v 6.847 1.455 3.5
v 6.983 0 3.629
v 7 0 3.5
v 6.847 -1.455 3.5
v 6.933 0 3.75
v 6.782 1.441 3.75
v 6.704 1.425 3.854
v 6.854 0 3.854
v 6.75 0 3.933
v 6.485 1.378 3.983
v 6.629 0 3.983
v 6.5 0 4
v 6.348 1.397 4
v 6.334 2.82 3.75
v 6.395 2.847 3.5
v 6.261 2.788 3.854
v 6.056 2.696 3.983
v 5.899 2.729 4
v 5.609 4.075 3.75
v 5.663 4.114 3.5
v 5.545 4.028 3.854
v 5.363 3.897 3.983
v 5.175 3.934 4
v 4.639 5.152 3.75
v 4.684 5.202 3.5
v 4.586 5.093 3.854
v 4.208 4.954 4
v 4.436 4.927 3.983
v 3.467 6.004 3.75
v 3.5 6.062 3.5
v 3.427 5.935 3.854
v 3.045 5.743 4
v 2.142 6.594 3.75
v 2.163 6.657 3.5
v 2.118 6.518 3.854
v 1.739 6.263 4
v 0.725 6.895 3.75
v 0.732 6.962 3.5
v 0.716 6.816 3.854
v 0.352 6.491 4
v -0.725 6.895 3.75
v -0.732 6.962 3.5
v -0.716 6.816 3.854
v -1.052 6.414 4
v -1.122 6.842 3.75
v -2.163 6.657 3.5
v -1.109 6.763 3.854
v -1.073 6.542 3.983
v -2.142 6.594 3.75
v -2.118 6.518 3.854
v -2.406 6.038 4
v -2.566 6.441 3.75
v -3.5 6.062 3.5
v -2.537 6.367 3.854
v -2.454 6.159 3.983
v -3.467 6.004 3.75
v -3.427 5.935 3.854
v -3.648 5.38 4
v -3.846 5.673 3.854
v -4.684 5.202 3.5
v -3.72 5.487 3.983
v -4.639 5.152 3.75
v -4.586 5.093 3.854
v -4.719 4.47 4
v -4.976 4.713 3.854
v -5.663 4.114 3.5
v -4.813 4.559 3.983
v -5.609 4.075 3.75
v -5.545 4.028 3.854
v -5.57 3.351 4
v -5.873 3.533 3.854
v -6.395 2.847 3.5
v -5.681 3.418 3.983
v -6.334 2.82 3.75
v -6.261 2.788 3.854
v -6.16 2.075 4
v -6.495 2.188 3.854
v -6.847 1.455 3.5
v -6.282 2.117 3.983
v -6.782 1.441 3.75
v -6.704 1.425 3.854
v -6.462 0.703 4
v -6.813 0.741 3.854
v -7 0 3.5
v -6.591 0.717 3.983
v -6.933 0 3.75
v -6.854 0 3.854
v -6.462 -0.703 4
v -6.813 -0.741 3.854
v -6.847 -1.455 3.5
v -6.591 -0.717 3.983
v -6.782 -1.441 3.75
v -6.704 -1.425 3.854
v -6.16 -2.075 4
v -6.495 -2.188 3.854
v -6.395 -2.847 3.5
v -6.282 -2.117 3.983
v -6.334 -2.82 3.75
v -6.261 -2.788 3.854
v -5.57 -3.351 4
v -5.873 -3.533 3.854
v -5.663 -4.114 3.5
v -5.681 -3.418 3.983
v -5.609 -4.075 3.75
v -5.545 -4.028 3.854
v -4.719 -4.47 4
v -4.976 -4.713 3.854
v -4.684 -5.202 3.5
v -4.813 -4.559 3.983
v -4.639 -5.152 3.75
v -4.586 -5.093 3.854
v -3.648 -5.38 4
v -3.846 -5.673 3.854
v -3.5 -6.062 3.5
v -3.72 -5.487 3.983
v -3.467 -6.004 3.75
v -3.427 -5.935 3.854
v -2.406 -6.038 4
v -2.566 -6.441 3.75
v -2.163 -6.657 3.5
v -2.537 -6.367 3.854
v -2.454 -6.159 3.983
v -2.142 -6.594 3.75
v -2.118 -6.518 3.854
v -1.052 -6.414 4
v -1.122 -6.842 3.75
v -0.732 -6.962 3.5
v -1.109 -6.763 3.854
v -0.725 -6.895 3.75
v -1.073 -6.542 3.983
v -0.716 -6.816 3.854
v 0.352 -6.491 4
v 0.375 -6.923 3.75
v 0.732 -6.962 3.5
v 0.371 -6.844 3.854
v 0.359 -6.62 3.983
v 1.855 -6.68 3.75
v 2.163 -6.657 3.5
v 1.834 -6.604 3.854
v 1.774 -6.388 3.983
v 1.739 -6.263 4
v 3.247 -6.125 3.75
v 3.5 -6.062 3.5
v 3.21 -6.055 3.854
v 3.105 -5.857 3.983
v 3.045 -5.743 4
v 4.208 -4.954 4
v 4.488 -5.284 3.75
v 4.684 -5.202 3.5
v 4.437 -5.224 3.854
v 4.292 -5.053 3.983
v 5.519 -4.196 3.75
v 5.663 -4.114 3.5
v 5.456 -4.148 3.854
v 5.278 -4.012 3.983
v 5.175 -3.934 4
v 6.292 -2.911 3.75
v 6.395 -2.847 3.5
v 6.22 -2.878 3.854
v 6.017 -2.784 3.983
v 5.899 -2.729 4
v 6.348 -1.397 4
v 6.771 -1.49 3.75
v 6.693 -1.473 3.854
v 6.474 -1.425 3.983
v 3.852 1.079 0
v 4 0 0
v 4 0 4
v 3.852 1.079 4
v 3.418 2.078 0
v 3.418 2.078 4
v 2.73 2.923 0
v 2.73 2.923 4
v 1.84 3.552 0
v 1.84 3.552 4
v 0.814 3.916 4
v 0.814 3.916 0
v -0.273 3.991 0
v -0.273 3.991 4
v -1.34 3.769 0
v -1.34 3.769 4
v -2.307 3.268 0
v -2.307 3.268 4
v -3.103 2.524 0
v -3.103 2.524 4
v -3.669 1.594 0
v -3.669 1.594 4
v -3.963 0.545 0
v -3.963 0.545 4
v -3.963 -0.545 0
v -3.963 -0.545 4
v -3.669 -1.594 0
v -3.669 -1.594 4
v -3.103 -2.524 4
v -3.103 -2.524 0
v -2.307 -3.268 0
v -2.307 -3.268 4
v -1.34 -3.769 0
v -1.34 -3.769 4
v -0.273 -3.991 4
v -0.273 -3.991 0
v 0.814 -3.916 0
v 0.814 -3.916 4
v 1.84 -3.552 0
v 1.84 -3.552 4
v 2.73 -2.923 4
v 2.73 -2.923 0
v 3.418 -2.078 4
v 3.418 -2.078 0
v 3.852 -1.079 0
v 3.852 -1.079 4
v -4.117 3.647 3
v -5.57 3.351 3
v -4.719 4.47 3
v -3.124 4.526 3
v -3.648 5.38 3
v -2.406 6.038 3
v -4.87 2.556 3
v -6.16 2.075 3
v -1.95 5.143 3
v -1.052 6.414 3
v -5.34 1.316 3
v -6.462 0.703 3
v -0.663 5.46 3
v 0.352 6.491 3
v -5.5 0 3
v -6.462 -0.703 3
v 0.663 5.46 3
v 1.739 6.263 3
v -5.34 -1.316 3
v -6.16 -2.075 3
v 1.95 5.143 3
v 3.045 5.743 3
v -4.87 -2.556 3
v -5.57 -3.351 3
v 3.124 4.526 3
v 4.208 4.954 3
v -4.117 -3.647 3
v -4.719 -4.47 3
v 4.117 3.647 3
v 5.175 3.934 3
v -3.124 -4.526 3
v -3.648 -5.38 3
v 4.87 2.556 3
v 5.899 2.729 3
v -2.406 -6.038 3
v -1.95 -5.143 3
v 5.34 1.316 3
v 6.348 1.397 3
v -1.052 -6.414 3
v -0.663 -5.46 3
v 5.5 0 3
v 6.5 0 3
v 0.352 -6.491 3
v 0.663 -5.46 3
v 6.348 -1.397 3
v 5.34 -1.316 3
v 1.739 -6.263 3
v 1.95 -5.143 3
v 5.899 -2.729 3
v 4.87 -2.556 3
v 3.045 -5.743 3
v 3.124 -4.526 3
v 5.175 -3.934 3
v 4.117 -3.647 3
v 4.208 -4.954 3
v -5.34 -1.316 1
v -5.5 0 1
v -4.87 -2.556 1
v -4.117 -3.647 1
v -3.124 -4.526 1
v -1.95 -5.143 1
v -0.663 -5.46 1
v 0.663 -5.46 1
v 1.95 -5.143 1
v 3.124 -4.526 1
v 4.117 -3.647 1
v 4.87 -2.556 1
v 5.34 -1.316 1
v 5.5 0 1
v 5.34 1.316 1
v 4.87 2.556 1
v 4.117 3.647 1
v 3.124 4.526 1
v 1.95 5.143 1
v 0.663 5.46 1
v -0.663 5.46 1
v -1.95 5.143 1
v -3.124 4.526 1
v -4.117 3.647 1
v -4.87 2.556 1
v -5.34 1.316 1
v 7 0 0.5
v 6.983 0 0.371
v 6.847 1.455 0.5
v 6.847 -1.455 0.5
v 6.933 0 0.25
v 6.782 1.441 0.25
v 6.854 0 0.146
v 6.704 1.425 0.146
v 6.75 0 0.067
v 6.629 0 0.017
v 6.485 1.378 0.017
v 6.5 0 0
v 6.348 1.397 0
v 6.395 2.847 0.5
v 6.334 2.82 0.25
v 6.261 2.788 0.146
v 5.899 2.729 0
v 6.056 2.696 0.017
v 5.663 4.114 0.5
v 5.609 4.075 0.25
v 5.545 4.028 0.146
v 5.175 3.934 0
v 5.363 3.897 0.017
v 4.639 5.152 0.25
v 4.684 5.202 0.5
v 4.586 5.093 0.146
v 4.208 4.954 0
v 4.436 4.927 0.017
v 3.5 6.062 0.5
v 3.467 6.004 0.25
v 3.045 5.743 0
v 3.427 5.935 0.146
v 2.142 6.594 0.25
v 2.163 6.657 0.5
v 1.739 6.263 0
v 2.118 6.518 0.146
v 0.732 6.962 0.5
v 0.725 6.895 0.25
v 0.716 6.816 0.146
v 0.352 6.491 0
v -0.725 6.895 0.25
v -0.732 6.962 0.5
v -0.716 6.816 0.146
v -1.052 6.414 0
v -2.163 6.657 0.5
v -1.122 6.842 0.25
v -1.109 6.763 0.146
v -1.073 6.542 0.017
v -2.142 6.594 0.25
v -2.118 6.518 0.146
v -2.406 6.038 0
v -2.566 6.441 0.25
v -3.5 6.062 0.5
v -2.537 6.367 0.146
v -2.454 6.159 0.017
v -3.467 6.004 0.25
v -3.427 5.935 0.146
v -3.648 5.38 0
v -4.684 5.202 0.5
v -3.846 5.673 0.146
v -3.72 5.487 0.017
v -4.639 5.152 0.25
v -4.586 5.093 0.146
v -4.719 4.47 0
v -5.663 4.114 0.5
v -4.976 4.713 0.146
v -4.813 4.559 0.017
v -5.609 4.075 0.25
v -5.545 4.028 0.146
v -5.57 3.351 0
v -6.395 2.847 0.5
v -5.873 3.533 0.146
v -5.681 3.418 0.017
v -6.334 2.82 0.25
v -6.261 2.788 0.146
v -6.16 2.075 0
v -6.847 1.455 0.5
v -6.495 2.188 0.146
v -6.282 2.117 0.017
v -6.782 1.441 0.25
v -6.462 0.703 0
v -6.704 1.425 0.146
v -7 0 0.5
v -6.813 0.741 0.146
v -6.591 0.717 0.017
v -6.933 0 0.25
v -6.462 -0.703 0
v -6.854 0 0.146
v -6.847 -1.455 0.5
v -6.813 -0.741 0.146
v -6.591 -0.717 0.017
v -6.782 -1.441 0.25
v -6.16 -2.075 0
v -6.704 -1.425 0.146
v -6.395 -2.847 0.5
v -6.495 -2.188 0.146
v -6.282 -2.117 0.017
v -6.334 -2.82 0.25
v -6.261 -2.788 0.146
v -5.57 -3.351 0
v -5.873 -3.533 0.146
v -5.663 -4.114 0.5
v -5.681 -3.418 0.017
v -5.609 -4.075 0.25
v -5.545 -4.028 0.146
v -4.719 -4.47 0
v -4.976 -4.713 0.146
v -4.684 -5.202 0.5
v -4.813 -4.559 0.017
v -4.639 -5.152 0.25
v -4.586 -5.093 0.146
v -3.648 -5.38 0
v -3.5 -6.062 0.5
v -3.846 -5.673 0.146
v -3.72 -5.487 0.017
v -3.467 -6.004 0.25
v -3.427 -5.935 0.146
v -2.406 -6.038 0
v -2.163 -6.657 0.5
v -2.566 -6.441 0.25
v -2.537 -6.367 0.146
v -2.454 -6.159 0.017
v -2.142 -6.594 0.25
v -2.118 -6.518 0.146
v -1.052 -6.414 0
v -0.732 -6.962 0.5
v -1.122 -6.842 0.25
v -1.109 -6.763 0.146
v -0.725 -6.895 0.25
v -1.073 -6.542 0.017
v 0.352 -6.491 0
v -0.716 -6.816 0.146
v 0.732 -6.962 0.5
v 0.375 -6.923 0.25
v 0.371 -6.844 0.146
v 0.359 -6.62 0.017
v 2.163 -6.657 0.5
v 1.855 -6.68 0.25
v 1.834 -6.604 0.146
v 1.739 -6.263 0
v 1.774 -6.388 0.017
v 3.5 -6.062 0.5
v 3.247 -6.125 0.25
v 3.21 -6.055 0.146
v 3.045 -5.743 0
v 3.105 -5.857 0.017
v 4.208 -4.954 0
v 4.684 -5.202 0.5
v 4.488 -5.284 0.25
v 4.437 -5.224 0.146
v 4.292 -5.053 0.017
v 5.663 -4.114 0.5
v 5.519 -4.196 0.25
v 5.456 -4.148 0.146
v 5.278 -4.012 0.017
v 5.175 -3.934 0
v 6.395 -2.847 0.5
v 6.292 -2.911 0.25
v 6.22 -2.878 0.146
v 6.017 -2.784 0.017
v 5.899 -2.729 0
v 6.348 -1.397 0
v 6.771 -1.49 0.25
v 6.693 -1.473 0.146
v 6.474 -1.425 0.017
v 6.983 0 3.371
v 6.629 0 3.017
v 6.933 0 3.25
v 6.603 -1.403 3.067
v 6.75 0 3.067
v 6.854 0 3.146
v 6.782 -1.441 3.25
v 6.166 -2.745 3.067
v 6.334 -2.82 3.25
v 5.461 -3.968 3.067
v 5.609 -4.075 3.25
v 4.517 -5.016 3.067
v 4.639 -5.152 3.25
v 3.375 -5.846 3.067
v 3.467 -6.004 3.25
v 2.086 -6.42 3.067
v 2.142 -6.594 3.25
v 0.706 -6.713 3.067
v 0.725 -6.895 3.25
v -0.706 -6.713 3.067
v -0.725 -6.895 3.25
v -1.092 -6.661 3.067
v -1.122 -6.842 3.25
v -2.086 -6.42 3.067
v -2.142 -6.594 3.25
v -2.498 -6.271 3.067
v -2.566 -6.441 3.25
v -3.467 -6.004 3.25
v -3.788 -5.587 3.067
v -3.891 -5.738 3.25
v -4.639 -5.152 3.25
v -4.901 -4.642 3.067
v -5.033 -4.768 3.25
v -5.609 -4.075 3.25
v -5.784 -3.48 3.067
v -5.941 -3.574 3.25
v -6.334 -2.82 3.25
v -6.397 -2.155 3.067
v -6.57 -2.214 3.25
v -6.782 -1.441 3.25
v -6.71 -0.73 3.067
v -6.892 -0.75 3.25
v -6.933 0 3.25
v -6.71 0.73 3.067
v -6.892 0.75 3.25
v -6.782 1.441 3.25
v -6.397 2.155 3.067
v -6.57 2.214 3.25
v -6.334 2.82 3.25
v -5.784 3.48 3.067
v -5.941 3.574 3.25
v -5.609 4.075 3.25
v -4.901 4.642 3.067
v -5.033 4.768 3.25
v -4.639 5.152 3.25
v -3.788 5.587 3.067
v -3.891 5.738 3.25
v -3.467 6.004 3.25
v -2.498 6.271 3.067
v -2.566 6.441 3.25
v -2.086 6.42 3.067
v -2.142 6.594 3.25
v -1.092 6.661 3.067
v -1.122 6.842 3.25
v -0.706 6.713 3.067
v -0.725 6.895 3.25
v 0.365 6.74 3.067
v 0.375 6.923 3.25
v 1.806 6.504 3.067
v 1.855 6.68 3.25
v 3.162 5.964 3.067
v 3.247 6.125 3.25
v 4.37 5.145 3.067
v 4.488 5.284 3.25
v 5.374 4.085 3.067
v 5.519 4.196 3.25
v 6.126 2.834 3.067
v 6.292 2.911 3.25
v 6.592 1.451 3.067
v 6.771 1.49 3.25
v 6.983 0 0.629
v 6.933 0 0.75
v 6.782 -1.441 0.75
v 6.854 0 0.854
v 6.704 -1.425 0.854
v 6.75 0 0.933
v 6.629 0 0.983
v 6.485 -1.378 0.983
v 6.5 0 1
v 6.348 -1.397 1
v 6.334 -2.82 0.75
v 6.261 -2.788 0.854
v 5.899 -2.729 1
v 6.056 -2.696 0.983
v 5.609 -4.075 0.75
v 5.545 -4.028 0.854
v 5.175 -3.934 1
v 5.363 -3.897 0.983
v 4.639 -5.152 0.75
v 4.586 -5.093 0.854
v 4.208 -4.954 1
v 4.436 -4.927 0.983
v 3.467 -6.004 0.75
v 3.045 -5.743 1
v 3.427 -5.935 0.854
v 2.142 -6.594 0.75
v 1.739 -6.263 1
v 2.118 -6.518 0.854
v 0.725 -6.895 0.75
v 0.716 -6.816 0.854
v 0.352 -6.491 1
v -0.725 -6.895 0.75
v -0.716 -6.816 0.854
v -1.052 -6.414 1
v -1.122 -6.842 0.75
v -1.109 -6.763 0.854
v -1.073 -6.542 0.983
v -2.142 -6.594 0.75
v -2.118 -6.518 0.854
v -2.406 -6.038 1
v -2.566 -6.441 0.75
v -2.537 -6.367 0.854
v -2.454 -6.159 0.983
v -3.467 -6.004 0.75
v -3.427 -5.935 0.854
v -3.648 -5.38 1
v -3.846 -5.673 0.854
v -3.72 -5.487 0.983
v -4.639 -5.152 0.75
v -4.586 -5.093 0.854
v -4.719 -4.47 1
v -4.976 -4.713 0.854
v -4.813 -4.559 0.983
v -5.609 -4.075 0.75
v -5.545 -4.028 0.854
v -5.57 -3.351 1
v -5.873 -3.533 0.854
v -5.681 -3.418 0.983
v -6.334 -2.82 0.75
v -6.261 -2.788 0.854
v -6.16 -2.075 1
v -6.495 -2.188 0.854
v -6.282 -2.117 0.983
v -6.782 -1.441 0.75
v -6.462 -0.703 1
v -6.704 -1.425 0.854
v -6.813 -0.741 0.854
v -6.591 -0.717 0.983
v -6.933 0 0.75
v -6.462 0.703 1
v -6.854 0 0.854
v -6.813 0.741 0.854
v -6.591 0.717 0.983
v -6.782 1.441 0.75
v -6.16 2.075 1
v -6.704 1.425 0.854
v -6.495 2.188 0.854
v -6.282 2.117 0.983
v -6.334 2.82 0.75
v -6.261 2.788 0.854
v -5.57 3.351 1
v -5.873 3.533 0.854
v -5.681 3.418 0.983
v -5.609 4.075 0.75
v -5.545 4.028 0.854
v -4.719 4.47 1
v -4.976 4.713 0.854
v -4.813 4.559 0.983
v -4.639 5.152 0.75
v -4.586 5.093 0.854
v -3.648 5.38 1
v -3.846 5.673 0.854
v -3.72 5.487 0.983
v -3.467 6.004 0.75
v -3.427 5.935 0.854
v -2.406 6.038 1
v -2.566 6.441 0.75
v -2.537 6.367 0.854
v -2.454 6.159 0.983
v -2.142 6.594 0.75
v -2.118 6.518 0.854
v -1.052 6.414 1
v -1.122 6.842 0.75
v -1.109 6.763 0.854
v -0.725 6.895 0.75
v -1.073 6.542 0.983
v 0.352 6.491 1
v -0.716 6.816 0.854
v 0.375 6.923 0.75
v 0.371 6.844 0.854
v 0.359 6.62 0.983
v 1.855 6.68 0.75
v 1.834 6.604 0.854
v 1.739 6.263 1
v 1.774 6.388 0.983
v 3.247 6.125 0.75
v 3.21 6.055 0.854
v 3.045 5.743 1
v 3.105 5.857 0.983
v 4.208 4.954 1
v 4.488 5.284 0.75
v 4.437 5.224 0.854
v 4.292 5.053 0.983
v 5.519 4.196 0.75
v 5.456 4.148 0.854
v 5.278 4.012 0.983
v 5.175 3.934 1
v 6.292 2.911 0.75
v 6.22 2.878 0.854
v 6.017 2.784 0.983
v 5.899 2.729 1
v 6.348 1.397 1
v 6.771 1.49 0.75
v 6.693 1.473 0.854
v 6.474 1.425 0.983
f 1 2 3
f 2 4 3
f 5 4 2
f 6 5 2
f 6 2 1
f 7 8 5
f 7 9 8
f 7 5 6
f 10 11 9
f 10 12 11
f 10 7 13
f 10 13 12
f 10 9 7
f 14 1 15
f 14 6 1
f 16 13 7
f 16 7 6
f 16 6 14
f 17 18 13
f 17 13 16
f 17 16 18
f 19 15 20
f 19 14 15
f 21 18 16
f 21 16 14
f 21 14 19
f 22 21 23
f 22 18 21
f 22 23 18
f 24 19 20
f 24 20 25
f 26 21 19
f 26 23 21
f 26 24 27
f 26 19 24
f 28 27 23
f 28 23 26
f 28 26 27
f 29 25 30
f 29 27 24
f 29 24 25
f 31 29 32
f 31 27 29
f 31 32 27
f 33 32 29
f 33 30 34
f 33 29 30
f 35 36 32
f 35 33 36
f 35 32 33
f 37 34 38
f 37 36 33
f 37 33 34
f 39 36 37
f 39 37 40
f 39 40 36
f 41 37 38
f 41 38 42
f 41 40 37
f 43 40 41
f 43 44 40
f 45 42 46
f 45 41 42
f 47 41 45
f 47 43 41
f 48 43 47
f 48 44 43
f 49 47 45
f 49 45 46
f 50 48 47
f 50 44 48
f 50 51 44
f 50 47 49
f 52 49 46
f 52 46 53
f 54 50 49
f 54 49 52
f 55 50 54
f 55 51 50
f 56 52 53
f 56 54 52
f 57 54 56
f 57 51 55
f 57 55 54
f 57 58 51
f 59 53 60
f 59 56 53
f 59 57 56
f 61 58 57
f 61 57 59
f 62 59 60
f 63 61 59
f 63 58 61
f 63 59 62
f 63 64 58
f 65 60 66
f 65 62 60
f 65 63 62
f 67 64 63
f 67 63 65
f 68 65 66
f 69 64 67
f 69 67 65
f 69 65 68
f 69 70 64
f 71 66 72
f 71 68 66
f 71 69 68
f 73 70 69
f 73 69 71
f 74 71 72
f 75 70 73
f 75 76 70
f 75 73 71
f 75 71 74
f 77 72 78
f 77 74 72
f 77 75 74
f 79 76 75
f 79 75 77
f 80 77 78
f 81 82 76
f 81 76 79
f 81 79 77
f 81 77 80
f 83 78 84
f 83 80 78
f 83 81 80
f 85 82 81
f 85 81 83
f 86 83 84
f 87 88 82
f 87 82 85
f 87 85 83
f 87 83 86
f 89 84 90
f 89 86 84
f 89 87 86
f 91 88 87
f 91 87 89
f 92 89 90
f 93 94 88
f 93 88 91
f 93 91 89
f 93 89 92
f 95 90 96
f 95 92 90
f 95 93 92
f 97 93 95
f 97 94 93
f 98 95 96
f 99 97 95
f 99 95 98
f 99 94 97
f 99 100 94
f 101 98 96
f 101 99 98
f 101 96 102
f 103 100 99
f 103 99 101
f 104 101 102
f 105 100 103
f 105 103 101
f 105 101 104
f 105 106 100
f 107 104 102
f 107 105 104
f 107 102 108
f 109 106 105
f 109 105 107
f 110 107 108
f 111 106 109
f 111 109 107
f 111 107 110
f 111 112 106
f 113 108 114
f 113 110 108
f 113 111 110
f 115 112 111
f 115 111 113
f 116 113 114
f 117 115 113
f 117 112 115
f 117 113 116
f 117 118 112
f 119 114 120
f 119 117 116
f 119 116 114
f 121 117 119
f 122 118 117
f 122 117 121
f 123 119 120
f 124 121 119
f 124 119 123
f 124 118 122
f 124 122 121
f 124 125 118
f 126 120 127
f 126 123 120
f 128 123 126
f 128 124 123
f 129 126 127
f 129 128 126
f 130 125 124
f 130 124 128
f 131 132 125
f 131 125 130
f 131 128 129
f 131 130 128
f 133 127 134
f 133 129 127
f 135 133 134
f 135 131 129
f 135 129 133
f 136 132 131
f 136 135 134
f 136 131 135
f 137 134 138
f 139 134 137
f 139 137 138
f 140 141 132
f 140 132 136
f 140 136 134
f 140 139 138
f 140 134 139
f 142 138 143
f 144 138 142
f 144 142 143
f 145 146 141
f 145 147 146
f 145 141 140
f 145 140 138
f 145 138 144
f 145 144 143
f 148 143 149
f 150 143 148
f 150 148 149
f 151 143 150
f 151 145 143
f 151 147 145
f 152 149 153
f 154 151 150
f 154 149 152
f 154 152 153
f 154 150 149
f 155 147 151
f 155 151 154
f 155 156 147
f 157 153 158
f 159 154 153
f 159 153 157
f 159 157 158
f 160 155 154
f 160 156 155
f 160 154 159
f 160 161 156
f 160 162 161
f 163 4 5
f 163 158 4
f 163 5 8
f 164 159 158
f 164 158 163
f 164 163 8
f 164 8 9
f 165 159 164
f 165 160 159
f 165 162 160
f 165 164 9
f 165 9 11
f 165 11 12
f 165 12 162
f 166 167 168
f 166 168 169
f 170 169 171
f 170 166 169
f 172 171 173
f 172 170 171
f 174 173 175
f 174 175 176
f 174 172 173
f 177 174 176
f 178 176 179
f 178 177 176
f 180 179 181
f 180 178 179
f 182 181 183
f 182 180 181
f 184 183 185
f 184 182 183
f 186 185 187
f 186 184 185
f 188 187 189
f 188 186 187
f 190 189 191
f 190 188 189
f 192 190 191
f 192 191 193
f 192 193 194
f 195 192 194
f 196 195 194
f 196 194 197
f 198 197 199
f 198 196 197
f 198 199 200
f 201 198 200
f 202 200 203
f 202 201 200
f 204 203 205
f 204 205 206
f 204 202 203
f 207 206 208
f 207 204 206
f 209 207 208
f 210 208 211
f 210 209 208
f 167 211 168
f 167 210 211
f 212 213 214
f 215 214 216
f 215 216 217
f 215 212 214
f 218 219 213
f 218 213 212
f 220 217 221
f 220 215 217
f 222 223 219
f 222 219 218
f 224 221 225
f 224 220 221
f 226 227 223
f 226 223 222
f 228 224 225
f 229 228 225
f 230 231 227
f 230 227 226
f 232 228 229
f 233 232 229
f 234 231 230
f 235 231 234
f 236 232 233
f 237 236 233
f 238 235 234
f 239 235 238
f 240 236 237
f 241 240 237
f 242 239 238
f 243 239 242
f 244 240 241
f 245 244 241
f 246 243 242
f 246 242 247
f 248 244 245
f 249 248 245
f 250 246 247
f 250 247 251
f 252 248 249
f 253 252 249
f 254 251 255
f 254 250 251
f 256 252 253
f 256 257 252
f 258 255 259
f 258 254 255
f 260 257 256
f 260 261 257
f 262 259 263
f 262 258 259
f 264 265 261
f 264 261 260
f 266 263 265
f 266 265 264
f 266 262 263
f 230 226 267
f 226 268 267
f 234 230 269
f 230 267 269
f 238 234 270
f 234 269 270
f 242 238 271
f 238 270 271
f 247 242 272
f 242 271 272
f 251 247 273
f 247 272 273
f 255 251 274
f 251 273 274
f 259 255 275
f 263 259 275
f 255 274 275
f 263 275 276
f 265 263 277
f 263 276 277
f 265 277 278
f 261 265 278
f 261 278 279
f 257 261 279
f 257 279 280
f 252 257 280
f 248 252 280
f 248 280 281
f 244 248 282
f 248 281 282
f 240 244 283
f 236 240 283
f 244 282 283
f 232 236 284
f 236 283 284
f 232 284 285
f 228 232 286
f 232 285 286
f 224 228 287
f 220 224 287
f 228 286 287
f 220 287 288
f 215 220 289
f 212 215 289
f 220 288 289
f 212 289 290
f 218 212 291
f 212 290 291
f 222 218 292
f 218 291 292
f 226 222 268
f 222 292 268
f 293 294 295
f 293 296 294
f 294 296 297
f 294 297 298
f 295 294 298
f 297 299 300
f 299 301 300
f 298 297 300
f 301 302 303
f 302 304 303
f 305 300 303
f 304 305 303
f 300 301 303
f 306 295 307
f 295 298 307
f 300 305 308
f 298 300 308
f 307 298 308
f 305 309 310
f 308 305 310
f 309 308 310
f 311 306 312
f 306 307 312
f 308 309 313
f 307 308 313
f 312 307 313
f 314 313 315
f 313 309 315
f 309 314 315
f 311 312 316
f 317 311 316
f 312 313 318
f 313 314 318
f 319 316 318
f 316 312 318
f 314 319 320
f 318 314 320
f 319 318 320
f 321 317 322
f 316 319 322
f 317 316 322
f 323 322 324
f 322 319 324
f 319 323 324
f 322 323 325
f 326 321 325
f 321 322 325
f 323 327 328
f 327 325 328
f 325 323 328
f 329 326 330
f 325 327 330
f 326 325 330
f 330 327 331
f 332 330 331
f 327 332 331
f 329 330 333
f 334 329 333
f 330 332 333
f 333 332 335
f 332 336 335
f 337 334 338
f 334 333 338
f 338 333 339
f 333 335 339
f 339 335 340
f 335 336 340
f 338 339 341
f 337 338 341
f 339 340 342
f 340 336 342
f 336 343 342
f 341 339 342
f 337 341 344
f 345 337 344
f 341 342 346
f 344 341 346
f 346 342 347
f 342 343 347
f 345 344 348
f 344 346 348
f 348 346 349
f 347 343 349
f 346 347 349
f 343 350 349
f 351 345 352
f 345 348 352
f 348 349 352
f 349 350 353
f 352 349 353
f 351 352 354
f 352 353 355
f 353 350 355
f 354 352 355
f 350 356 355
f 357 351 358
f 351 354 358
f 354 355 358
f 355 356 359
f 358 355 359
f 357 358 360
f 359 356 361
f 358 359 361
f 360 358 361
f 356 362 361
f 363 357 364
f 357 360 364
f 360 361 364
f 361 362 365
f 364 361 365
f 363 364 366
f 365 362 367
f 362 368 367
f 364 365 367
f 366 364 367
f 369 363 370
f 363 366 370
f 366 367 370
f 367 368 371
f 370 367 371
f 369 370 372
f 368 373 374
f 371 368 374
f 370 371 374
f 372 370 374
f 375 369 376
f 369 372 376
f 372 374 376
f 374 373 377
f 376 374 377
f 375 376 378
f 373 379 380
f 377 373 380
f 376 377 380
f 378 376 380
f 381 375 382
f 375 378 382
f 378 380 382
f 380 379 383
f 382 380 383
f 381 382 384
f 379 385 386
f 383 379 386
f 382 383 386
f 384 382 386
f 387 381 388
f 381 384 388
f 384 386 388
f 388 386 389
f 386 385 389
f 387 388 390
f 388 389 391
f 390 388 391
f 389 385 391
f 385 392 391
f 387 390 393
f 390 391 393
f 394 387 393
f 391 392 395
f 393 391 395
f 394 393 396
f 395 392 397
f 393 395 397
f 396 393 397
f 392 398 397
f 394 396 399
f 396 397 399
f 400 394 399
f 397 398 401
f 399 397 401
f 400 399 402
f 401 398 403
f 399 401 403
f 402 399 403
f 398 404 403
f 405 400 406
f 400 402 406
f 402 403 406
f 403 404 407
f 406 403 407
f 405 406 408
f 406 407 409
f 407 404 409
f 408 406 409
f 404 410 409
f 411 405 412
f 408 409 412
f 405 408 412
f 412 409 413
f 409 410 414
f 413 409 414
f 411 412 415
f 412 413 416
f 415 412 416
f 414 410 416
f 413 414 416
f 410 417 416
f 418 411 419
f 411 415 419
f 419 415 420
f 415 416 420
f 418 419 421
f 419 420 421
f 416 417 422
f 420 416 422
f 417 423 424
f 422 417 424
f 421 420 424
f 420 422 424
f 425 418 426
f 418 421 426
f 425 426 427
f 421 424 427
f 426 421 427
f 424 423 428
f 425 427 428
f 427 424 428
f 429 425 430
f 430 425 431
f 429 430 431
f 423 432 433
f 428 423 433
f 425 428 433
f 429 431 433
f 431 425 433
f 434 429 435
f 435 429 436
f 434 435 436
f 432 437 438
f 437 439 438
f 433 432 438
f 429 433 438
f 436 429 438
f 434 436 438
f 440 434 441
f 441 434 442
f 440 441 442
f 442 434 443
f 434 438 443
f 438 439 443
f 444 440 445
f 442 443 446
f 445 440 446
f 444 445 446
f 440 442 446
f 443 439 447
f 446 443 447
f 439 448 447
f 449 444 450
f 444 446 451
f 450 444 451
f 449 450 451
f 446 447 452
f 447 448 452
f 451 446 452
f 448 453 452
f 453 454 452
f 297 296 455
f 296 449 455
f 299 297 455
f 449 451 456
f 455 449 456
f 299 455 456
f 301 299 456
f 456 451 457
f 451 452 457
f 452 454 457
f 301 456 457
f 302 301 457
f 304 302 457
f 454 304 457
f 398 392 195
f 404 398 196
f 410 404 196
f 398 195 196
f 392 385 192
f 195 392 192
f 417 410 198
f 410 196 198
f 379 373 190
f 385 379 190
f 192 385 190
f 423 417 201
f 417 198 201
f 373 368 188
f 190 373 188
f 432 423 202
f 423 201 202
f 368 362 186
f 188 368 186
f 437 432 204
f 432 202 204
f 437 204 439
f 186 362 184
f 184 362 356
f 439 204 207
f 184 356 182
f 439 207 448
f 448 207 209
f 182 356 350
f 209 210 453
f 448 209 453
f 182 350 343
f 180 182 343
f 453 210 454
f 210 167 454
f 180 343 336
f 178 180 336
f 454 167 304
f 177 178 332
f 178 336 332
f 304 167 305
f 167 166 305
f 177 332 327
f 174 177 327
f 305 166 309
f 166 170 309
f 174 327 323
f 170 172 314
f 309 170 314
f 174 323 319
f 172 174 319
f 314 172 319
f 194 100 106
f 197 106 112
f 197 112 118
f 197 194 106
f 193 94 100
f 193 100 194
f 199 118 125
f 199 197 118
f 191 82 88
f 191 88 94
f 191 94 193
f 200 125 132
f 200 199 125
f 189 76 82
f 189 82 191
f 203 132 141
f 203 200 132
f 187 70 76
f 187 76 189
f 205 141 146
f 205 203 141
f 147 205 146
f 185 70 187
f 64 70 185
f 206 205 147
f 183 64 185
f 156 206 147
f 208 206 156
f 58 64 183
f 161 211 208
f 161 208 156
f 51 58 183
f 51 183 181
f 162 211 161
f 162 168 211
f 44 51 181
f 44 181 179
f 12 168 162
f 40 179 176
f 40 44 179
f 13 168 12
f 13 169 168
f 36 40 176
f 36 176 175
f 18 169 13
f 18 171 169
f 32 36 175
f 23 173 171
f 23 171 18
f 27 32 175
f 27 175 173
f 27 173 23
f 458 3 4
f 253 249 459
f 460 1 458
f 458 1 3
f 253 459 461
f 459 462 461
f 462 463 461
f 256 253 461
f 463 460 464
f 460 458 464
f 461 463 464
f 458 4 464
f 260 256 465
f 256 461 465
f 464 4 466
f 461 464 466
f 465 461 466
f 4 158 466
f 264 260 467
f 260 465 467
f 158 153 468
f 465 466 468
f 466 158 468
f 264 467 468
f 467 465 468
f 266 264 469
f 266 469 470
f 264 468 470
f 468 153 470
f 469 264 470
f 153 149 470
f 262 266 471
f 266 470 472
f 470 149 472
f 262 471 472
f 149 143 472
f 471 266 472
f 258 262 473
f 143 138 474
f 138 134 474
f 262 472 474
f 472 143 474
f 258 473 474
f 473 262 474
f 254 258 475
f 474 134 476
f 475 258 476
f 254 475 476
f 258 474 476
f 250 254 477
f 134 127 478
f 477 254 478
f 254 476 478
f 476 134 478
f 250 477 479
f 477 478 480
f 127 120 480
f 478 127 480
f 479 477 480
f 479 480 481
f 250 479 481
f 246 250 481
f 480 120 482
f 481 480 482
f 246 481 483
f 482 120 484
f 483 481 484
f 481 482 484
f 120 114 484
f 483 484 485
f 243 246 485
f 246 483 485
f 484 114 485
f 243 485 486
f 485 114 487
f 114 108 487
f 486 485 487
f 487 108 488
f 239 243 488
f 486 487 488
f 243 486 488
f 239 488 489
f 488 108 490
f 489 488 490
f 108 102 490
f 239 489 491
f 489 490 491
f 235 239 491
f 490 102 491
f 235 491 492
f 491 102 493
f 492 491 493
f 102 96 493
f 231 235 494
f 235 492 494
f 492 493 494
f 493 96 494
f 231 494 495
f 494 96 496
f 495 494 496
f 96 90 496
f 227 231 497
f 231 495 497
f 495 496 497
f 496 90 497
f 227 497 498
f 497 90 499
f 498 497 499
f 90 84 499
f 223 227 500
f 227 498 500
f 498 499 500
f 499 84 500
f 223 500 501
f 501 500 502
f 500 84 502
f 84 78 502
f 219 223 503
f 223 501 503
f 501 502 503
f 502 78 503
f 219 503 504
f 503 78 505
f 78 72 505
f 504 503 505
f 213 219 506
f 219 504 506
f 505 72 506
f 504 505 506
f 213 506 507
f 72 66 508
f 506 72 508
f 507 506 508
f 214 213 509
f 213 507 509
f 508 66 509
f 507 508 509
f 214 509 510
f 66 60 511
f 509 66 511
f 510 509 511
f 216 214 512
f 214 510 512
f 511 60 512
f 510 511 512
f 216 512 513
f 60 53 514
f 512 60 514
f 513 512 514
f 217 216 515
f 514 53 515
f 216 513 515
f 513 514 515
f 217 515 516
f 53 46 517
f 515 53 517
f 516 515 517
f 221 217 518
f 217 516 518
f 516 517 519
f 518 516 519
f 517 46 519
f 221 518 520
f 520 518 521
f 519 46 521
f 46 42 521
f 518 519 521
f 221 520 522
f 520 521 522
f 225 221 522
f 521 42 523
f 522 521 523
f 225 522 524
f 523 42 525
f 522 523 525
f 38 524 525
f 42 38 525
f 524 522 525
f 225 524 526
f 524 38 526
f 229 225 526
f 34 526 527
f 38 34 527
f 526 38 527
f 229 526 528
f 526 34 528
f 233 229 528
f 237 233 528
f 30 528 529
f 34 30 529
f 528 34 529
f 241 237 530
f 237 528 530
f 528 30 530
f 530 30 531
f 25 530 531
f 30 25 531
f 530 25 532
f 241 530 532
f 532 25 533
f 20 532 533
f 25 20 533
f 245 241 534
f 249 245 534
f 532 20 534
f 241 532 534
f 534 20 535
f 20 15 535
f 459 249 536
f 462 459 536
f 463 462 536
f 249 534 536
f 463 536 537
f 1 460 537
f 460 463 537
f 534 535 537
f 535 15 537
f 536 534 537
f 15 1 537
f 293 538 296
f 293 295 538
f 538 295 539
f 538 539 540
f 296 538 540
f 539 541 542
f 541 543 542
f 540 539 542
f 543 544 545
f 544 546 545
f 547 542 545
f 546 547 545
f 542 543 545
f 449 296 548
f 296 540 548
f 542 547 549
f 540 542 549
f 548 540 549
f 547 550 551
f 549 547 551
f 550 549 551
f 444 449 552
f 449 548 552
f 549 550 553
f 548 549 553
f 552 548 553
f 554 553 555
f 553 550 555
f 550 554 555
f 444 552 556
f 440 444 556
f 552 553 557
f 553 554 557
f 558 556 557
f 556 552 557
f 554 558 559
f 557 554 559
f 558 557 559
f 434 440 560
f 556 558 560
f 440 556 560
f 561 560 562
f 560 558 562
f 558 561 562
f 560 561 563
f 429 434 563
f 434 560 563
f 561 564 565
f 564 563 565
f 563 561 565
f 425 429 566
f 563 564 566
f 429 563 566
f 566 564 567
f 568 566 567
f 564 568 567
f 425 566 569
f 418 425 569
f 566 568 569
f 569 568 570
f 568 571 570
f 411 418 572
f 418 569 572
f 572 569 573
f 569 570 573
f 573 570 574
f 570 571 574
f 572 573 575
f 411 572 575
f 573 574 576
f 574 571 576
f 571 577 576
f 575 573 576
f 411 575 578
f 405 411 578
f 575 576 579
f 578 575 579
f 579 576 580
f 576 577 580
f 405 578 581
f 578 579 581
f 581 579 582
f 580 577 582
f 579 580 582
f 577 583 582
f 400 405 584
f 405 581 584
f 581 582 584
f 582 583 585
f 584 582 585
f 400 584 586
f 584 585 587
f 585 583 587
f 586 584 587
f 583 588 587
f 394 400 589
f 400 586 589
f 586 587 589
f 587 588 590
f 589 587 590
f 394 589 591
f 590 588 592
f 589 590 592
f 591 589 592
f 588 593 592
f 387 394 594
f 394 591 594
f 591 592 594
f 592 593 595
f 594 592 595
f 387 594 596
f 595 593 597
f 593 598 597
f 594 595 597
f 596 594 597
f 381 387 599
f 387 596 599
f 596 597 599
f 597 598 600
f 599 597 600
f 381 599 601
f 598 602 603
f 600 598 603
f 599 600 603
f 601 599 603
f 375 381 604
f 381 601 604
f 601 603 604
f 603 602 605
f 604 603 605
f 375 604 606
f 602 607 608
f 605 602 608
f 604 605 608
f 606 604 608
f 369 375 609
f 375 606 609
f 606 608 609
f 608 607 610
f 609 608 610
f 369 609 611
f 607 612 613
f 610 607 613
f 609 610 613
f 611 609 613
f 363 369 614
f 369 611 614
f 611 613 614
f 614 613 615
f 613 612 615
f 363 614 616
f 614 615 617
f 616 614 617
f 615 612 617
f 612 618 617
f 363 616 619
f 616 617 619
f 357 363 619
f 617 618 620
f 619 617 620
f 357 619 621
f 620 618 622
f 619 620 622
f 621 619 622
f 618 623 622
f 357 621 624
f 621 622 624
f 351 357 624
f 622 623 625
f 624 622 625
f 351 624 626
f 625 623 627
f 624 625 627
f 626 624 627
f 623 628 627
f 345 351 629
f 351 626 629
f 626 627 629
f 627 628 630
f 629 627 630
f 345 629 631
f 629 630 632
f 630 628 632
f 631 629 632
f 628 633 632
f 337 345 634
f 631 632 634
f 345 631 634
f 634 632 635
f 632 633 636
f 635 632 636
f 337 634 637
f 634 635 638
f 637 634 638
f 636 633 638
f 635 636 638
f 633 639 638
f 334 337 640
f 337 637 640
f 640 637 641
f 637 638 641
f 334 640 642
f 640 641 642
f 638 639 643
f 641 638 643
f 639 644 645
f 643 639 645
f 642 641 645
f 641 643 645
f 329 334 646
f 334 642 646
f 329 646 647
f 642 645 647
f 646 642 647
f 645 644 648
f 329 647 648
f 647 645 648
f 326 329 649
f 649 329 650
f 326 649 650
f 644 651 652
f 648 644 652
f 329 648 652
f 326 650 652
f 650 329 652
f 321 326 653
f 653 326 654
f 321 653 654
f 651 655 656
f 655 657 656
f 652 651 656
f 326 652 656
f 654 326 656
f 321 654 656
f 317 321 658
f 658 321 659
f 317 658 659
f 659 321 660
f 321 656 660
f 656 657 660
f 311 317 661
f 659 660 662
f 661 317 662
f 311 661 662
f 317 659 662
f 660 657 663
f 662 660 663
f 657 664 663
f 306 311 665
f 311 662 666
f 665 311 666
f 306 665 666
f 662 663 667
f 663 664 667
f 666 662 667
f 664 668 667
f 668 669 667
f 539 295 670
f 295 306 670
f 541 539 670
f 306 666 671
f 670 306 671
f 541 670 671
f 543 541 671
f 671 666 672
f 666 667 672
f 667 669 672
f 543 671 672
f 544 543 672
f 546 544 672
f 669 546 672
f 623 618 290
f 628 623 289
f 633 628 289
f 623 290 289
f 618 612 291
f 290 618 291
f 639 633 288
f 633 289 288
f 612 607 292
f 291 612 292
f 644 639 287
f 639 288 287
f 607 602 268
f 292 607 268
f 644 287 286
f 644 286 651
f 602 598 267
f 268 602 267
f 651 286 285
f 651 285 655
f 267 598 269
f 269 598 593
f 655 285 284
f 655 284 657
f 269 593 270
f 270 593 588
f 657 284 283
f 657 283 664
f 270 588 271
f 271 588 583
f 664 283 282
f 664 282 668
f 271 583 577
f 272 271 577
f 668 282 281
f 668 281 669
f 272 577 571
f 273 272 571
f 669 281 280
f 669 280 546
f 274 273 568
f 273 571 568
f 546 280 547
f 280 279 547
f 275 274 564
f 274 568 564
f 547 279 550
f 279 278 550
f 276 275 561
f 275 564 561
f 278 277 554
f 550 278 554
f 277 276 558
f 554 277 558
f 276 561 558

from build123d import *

# Parameters (mm, degrees)
SKETCH_1_R      = 7
SKETCH_1_R_2    = 4
EXTRUDE_1_DEPTH = 4
SKETCH_2_W      = 2
SKETCH_2_H      = 1.5
FILLET_1_R      = 0.5


with BuildPart() as part:
    # 草图1 → 凸台-拉伸1 (new body)
    with BuildSketch(Plane.XY):
        Circle(SKETCH_1_R)
        Circle(SKETCH_1_R_2, mode=Mode.SUBTRACT)
    extrude(amount=EXTRUDE_1_DEPTH)

    # 草图2 → 切除-旋转1 (revolve, cut)
    with BuildSketch(Plane(origin=(0, 0, 0), x_dir=(0, 0, -1), z_dir=(1, 0, 0)), mode=Mode.PRIVATE) as cut_revolve_1_sk:
        with Locations((-2, 6.25)):
            Rectangle(SKETCH_2_W, SKETCH_2_H)
    revolve(cut_revolve_1_sk.sketch.rotate(Axis((0, 0, -1.510874211), (0, 0, 1)), 90), axis=Axis((0, 0, -1.510874211), (0, 0, 1)), mode=Mode.SUBTRACT)

    # 圆角1
    fillet_1_edges = [part.edges().sort_by_distance(p)[0] for p in [
        (-7, 0, 1),
        (-7, 0, 3),
        (-7, 0, 0),
        (-7, 0, 4),
    ]]
    fillet(fillet_1_edges, radius=FILLET_1_R - 0.0001)  # a hair under: the kernel refuses the full size


solid = part.part
